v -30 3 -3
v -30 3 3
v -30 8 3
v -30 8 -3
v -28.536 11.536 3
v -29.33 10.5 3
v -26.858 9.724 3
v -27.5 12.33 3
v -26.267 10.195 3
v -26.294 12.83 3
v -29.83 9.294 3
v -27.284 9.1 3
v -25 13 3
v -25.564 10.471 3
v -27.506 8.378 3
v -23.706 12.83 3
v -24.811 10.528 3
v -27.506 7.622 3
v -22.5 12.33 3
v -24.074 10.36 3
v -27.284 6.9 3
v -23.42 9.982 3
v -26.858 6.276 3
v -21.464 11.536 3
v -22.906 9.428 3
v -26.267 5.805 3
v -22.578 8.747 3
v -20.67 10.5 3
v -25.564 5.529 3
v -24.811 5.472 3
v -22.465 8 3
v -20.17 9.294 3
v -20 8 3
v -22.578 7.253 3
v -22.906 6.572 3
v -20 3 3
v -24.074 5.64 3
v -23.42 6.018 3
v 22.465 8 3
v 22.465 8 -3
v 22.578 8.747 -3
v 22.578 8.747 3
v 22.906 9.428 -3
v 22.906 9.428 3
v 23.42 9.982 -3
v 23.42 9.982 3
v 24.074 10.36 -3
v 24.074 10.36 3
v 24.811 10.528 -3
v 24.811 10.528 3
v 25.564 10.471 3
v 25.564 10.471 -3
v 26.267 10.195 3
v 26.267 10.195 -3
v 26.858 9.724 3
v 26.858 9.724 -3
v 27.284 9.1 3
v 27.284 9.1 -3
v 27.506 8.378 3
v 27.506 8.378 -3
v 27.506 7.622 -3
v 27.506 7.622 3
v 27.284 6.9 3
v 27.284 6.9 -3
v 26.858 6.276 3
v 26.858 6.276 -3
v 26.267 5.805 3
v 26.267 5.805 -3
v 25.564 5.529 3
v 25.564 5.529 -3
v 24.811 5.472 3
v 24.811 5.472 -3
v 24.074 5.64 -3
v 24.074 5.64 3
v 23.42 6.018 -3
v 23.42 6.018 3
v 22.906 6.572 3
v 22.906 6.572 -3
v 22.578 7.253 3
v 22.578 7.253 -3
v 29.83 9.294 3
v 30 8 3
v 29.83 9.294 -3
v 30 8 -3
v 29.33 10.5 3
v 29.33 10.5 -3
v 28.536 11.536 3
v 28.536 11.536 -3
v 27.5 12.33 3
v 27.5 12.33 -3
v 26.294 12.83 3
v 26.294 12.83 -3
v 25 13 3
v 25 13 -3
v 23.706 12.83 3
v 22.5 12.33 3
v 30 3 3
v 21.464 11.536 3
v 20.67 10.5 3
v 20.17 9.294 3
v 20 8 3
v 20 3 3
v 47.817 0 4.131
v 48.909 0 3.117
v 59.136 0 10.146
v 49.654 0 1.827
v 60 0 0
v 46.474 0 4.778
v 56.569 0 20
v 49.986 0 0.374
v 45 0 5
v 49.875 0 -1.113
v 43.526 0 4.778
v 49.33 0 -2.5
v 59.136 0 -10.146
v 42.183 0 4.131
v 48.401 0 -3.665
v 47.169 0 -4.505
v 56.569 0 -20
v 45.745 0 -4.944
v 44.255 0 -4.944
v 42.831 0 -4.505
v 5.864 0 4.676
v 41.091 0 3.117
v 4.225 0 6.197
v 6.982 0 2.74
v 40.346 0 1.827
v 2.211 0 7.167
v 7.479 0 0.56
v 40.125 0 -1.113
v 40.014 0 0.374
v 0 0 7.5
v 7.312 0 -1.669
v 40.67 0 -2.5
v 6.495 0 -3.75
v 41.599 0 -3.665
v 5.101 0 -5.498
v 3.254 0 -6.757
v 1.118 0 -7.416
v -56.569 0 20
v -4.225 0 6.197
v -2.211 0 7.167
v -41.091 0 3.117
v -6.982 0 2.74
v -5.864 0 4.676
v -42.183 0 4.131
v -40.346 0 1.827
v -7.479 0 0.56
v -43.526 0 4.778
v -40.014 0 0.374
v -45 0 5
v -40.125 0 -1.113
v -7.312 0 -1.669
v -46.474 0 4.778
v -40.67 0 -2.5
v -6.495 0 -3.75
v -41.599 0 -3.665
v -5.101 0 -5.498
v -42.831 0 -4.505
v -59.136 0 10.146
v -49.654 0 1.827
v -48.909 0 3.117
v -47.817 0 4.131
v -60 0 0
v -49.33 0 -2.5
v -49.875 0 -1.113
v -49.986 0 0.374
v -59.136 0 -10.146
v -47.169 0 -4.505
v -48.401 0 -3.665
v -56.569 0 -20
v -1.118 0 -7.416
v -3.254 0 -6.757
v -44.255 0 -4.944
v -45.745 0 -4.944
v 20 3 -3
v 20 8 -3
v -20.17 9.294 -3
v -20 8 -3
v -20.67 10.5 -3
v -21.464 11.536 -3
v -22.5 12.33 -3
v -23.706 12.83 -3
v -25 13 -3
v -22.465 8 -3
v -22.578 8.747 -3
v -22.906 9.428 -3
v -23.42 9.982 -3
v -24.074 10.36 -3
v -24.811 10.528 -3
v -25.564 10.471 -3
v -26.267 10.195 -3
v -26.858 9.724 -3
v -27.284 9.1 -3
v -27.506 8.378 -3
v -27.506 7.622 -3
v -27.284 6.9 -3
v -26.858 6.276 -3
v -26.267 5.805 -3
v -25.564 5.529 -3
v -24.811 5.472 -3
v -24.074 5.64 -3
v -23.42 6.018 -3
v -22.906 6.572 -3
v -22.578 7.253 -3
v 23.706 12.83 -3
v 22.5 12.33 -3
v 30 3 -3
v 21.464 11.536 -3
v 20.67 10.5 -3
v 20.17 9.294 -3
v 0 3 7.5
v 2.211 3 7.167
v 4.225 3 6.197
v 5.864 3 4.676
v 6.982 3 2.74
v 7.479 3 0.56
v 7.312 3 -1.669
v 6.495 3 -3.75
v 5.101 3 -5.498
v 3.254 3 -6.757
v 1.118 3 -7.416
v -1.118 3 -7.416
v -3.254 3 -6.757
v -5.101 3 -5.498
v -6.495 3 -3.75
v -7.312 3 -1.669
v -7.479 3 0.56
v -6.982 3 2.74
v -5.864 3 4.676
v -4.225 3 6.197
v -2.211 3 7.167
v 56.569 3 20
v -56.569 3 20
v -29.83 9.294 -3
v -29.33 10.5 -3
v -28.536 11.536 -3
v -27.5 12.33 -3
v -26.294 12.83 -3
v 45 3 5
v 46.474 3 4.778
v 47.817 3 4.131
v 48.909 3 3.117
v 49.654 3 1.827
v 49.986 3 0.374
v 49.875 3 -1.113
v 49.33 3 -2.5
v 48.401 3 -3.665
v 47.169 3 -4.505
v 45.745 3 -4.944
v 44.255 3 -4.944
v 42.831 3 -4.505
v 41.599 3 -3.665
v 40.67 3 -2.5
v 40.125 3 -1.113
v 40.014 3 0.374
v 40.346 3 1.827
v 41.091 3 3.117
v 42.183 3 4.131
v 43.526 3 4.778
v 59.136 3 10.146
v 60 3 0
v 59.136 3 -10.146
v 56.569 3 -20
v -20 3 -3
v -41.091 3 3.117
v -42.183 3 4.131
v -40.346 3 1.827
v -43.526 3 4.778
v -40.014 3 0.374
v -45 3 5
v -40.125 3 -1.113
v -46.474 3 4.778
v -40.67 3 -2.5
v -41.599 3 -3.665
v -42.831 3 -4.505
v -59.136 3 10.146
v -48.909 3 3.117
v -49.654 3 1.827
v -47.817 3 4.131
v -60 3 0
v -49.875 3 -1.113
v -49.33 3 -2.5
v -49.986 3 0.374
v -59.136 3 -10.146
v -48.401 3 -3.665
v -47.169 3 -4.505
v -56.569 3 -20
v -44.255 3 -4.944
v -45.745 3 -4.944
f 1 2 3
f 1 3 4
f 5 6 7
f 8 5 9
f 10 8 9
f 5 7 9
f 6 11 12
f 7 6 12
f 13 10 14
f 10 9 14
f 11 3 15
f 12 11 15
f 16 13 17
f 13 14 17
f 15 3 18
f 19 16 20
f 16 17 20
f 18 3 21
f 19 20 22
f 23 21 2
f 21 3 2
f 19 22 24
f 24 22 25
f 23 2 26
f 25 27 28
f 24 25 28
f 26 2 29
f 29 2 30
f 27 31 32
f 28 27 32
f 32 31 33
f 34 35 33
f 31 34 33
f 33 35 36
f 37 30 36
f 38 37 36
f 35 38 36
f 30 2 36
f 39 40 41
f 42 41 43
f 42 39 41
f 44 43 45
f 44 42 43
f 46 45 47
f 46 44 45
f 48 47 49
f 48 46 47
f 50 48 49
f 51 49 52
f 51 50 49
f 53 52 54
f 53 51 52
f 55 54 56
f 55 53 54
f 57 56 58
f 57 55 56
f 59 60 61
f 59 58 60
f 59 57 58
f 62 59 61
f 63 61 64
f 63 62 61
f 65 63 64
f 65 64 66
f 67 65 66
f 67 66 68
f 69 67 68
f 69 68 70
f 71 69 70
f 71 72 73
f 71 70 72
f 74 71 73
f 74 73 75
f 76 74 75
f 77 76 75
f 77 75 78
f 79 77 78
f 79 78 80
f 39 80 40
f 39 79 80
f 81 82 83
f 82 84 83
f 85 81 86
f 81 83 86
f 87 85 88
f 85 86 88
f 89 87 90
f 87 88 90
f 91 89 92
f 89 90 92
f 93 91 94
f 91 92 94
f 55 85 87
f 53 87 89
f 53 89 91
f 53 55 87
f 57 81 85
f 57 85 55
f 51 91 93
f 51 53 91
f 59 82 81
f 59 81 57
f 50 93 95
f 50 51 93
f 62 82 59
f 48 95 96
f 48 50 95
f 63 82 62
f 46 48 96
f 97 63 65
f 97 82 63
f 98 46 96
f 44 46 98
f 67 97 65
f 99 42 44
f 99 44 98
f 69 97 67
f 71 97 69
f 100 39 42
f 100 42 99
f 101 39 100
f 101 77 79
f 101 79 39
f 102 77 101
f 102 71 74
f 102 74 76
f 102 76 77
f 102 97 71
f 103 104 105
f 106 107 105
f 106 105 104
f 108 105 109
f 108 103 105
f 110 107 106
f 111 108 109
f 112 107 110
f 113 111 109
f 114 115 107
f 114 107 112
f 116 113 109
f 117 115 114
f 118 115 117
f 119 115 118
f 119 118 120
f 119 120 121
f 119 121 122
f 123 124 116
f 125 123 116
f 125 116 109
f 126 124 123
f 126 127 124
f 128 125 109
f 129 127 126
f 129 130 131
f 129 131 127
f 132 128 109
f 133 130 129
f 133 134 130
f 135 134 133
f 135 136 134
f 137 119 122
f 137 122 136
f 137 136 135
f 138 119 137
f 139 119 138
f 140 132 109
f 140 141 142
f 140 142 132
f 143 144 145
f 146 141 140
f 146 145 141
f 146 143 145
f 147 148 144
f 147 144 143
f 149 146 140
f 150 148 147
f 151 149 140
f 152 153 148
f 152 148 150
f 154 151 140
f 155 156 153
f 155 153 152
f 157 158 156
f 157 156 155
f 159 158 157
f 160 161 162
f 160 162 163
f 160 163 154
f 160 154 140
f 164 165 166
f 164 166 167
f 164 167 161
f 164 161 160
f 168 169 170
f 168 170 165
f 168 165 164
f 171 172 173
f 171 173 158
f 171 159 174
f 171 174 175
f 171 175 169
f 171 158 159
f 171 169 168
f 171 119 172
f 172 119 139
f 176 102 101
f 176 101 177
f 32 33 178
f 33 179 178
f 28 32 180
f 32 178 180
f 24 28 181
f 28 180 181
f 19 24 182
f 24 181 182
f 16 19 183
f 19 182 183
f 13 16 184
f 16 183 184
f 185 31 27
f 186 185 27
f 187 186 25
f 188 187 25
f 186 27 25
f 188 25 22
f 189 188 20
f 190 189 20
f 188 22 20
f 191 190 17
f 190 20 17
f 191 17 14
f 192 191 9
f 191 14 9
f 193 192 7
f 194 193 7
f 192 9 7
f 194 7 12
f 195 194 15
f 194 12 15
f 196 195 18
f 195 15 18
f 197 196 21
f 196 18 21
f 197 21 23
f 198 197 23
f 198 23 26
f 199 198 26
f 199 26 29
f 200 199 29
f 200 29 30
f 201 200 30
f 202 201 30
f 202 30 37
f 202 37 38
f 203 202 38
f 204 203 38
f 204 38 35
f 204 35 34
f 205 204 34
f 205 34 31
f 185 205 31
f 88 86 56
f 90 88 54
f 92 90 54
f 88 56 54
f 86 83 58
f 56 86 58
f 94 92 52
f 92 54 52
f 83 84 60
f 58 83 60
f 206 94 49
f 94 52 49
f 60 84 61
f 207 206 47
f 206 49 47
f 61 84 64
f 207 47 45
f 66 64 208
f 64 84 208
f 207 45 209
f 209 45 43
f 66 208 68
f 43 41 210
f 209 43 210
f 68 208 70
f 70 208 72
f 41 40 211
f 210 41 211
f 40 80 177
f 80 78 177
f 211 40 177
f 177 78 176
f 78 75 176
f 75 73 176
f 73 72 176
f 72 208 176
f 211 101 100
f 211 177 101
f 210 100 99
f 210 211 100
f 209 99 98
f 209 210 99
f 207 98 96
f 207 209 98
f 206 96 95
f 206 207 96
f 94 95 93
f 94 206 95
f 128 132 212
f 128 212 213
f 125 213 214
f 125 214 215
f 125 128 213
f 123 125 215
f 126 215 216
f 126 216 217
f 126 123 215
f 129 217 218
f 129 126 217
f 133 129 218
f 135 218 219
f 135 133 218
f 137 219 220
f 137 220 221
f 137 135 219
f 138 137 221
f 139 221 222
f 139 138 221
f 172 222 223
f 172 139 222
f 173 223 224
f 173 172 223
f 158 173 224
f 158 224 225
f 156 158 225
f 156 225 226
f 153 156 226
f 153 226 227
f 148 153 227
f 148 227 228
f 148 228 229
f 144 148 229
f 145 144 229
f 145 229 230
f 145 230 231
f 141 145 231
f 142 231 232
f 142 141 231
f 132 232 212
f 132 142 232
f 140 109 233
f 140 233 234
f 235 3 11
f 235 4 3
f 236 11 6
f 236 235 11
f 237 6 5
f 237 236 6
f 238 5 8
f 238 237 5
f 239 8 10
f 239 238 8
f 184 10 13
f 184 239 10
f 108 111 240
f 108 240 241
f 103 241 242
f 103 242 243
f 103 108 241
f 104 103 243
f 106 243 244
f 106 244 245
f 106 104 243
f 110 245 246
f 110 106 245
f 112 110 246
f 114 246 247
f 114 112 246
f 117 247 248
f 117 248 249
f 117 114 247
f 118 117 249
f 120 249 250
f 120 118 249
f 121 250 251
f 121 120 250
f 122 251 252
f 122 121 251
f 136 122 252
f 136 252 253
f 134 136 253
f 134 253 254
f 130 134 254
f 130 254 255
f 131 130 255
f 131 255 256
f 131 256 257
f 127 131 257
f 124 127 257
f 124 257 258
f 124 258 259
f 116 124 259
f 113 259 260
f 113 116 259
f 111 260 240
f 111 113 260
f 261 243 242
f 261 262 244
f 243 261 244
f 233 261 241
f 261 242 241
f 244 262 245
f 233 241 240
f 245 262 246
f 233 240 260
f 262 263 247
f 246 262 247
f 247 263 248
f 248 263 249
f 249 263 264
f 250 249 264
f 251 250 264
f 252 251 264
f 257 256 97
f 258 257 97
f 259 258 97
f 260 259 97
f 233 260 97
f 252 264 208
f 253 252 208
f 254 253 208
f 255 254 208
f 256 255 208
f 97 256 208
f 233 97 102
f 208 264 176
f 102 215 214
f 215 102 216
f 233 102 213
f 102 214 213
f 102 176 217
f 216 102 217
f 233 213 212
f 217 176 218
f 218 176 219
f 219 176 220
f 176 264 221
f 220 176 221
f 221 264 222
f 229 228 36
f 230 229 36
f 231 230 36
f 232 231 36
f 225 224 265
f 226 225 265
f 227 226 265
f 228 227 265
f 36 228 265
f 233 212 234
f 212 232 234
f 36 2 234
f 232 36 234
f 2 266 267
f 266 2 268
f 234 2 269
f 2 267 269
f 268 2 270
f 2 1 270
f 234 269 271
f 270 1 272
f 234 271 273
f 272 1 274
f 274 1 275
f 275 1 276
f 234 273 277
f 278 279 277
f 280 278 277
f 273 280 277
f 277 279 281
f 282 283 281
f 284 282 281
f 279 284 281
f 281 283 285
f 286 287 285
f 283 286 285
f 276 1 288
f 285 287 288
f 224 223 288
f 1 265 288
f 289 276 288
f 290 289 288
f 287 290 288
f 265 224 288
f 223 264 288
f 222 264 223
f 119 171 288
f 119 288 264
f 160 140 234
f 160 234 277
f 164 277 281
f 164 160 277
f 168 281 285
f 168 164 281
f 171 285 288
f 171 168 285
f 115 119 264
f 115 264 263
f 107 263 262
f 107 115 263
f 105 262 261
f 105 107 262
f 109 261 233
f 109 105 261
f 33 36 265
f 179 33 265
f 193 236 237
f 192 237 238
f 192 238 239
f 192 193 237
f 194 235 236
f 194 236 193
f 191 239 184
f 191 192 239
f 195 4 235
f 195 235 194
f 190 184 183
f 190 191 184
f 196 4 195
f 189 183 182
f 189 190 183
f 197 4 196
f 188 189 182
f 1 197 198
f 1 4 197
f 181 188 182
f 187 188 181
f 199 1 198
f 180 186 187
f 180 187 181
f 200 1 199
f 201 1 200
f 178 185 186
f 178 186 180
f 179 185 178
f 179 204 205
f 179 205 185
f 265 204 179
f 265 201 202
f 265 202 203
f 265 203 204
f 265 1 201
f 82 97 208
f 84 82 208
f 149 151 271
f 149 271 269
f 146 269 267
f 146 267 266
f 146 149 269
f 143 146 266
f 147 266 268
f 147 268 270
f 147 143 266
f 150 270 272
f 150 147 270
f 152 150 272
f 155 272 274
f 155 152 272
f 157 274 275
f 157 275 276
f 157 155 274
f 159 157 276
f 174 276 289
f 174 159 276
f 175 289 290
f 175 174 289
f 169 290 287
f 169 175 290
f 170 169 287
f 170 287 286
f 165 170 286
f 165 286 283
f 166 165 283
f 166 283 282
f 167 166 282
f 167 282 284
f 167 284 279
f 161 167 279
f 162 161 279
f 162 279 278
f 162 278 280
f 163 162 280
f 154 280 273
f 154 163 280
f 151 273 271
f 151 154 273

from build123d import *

# Parameters (mm, degrees)
SCHIZZO1_R                   = 5
SCHIZZO1_R_2                 = 7.5
ESTRUSIONE_ESTRUSIONE1_DEPTH = 3
SCHIZZO3_W                   = 10
SCHIZZO3_H                   = 6
ESTRUSIONE_ESTRUSIONE2_DEPTH = 10
SCHIZZO4_R                   = 2.534735547
TAGLIO_ESTRUSIONE1_DEPTH     = 9
RACCORDO1_R                  = 5
RACCORDO1_OF_SPECCHIA1_R     = 5


with BuildPart() as part:
    # Schizzo1 → Estrusione-Estrusione1 (new body)
    with BuildSketch(Plane(origin=(0, 0, 0), x_dir=(1, 0, 0), z_dir=(0, 1, 0))):
        with BuildLine():
            Line((-56.568542495, 20), (56.568542495, 20))
            ThreePointArc((56.568542495, 20), (60, 0), (56.568542495, -20))
            Line((56.568542495, -20), (-56.568542495, -20))
            ThreePointArc((-56.568542495, -20), (-60, 0), (-56.568542495, 20))
        make_face()
        with Locations(Location((45, 0, 0), (0, 0, 270))):
            Circle(SCHIZZO1_R, mode=Mode.SUBTRACT)
        with Locations(Location((-45, 0, 0), (0, 0, 270))):
            Circle(SCHIZZO1_R, mode=Mode.SUBTRACT)
        with Locations(Location((0, 0, 0), (0, 0, 270))):
            Circle(SCHIZZO1_R_2, mode=Mode.SUBTRACT)
    extrude(amount=ESTRUSIONE_ESTRUSIONE1_DEPTH)

    # Schizzo3 → Estrusione-Estrusione2 (add)
    with BuildSketch(Plane(origin=(0, 3, 0), x_dir=(1, 0, 0), z_dir=(0, 1, 0))):
        with Locations((-25, 0)):
            Rectangle(SCHIZZO3_W, SCHIZZO3_H)
    estrusione_estrusione2 = extrude(amount=ESTRUSIONE_ESTRUSIONE2_DEPTH)

    # Schizzo4 → Taglio-Estrusione1 (cut)
    with BuildSketch(Plane.XY.offset(3)):
        with Locations((-25, 8)):
            Circle(SCHIZZO4_R)
    taglio_estrusione1 = extrude(amount=-TAGLIO_ESTRUSIONE1_DEPTH, mode=Mode.SUBTRACT)

    # Raccordo1
    raccordo1_edges = [part.edges().sort_by_distance(p)[0] for p in [
        (-20, 13, 0),
        (-30, 13, 0),
    ]]
    fillet(raccordo1_edges, radius=RACCORDO1_R - 0.0001)  # a hair under: the kernel refuses the full size

    # Specchia1: Estrusione-Estrusione2, Taglio-Estrusione1 across plane
    add(estrusione_estrusione2.mirror(Plane(origin=(0, 0, 0), x_dir=(0, 0, 1), z_dir=(1, 0, 0))))
    add(taglio_estrusione1.mirror(Plane(origin=(0, 0, 0), x_dir=(0, 0, 1), z_dir=(1, 0, 0))), mode=Mode.SUBTRACT)

    # Raccordo1 of Specchia1
    raccordo1_of_specchia1_edges = [part.edges().sort_by_distance(p)[0] for p in [
        (20, 13, 0),
        (30, 13, 0),
    ]]
    fillet(raccordo1_of_specchia1_edges, radius=RACCORDO1_OF_SPECCHIA1_R - 0.0001)  # a hair under: the kernel refuses the full size


solid = part.part
